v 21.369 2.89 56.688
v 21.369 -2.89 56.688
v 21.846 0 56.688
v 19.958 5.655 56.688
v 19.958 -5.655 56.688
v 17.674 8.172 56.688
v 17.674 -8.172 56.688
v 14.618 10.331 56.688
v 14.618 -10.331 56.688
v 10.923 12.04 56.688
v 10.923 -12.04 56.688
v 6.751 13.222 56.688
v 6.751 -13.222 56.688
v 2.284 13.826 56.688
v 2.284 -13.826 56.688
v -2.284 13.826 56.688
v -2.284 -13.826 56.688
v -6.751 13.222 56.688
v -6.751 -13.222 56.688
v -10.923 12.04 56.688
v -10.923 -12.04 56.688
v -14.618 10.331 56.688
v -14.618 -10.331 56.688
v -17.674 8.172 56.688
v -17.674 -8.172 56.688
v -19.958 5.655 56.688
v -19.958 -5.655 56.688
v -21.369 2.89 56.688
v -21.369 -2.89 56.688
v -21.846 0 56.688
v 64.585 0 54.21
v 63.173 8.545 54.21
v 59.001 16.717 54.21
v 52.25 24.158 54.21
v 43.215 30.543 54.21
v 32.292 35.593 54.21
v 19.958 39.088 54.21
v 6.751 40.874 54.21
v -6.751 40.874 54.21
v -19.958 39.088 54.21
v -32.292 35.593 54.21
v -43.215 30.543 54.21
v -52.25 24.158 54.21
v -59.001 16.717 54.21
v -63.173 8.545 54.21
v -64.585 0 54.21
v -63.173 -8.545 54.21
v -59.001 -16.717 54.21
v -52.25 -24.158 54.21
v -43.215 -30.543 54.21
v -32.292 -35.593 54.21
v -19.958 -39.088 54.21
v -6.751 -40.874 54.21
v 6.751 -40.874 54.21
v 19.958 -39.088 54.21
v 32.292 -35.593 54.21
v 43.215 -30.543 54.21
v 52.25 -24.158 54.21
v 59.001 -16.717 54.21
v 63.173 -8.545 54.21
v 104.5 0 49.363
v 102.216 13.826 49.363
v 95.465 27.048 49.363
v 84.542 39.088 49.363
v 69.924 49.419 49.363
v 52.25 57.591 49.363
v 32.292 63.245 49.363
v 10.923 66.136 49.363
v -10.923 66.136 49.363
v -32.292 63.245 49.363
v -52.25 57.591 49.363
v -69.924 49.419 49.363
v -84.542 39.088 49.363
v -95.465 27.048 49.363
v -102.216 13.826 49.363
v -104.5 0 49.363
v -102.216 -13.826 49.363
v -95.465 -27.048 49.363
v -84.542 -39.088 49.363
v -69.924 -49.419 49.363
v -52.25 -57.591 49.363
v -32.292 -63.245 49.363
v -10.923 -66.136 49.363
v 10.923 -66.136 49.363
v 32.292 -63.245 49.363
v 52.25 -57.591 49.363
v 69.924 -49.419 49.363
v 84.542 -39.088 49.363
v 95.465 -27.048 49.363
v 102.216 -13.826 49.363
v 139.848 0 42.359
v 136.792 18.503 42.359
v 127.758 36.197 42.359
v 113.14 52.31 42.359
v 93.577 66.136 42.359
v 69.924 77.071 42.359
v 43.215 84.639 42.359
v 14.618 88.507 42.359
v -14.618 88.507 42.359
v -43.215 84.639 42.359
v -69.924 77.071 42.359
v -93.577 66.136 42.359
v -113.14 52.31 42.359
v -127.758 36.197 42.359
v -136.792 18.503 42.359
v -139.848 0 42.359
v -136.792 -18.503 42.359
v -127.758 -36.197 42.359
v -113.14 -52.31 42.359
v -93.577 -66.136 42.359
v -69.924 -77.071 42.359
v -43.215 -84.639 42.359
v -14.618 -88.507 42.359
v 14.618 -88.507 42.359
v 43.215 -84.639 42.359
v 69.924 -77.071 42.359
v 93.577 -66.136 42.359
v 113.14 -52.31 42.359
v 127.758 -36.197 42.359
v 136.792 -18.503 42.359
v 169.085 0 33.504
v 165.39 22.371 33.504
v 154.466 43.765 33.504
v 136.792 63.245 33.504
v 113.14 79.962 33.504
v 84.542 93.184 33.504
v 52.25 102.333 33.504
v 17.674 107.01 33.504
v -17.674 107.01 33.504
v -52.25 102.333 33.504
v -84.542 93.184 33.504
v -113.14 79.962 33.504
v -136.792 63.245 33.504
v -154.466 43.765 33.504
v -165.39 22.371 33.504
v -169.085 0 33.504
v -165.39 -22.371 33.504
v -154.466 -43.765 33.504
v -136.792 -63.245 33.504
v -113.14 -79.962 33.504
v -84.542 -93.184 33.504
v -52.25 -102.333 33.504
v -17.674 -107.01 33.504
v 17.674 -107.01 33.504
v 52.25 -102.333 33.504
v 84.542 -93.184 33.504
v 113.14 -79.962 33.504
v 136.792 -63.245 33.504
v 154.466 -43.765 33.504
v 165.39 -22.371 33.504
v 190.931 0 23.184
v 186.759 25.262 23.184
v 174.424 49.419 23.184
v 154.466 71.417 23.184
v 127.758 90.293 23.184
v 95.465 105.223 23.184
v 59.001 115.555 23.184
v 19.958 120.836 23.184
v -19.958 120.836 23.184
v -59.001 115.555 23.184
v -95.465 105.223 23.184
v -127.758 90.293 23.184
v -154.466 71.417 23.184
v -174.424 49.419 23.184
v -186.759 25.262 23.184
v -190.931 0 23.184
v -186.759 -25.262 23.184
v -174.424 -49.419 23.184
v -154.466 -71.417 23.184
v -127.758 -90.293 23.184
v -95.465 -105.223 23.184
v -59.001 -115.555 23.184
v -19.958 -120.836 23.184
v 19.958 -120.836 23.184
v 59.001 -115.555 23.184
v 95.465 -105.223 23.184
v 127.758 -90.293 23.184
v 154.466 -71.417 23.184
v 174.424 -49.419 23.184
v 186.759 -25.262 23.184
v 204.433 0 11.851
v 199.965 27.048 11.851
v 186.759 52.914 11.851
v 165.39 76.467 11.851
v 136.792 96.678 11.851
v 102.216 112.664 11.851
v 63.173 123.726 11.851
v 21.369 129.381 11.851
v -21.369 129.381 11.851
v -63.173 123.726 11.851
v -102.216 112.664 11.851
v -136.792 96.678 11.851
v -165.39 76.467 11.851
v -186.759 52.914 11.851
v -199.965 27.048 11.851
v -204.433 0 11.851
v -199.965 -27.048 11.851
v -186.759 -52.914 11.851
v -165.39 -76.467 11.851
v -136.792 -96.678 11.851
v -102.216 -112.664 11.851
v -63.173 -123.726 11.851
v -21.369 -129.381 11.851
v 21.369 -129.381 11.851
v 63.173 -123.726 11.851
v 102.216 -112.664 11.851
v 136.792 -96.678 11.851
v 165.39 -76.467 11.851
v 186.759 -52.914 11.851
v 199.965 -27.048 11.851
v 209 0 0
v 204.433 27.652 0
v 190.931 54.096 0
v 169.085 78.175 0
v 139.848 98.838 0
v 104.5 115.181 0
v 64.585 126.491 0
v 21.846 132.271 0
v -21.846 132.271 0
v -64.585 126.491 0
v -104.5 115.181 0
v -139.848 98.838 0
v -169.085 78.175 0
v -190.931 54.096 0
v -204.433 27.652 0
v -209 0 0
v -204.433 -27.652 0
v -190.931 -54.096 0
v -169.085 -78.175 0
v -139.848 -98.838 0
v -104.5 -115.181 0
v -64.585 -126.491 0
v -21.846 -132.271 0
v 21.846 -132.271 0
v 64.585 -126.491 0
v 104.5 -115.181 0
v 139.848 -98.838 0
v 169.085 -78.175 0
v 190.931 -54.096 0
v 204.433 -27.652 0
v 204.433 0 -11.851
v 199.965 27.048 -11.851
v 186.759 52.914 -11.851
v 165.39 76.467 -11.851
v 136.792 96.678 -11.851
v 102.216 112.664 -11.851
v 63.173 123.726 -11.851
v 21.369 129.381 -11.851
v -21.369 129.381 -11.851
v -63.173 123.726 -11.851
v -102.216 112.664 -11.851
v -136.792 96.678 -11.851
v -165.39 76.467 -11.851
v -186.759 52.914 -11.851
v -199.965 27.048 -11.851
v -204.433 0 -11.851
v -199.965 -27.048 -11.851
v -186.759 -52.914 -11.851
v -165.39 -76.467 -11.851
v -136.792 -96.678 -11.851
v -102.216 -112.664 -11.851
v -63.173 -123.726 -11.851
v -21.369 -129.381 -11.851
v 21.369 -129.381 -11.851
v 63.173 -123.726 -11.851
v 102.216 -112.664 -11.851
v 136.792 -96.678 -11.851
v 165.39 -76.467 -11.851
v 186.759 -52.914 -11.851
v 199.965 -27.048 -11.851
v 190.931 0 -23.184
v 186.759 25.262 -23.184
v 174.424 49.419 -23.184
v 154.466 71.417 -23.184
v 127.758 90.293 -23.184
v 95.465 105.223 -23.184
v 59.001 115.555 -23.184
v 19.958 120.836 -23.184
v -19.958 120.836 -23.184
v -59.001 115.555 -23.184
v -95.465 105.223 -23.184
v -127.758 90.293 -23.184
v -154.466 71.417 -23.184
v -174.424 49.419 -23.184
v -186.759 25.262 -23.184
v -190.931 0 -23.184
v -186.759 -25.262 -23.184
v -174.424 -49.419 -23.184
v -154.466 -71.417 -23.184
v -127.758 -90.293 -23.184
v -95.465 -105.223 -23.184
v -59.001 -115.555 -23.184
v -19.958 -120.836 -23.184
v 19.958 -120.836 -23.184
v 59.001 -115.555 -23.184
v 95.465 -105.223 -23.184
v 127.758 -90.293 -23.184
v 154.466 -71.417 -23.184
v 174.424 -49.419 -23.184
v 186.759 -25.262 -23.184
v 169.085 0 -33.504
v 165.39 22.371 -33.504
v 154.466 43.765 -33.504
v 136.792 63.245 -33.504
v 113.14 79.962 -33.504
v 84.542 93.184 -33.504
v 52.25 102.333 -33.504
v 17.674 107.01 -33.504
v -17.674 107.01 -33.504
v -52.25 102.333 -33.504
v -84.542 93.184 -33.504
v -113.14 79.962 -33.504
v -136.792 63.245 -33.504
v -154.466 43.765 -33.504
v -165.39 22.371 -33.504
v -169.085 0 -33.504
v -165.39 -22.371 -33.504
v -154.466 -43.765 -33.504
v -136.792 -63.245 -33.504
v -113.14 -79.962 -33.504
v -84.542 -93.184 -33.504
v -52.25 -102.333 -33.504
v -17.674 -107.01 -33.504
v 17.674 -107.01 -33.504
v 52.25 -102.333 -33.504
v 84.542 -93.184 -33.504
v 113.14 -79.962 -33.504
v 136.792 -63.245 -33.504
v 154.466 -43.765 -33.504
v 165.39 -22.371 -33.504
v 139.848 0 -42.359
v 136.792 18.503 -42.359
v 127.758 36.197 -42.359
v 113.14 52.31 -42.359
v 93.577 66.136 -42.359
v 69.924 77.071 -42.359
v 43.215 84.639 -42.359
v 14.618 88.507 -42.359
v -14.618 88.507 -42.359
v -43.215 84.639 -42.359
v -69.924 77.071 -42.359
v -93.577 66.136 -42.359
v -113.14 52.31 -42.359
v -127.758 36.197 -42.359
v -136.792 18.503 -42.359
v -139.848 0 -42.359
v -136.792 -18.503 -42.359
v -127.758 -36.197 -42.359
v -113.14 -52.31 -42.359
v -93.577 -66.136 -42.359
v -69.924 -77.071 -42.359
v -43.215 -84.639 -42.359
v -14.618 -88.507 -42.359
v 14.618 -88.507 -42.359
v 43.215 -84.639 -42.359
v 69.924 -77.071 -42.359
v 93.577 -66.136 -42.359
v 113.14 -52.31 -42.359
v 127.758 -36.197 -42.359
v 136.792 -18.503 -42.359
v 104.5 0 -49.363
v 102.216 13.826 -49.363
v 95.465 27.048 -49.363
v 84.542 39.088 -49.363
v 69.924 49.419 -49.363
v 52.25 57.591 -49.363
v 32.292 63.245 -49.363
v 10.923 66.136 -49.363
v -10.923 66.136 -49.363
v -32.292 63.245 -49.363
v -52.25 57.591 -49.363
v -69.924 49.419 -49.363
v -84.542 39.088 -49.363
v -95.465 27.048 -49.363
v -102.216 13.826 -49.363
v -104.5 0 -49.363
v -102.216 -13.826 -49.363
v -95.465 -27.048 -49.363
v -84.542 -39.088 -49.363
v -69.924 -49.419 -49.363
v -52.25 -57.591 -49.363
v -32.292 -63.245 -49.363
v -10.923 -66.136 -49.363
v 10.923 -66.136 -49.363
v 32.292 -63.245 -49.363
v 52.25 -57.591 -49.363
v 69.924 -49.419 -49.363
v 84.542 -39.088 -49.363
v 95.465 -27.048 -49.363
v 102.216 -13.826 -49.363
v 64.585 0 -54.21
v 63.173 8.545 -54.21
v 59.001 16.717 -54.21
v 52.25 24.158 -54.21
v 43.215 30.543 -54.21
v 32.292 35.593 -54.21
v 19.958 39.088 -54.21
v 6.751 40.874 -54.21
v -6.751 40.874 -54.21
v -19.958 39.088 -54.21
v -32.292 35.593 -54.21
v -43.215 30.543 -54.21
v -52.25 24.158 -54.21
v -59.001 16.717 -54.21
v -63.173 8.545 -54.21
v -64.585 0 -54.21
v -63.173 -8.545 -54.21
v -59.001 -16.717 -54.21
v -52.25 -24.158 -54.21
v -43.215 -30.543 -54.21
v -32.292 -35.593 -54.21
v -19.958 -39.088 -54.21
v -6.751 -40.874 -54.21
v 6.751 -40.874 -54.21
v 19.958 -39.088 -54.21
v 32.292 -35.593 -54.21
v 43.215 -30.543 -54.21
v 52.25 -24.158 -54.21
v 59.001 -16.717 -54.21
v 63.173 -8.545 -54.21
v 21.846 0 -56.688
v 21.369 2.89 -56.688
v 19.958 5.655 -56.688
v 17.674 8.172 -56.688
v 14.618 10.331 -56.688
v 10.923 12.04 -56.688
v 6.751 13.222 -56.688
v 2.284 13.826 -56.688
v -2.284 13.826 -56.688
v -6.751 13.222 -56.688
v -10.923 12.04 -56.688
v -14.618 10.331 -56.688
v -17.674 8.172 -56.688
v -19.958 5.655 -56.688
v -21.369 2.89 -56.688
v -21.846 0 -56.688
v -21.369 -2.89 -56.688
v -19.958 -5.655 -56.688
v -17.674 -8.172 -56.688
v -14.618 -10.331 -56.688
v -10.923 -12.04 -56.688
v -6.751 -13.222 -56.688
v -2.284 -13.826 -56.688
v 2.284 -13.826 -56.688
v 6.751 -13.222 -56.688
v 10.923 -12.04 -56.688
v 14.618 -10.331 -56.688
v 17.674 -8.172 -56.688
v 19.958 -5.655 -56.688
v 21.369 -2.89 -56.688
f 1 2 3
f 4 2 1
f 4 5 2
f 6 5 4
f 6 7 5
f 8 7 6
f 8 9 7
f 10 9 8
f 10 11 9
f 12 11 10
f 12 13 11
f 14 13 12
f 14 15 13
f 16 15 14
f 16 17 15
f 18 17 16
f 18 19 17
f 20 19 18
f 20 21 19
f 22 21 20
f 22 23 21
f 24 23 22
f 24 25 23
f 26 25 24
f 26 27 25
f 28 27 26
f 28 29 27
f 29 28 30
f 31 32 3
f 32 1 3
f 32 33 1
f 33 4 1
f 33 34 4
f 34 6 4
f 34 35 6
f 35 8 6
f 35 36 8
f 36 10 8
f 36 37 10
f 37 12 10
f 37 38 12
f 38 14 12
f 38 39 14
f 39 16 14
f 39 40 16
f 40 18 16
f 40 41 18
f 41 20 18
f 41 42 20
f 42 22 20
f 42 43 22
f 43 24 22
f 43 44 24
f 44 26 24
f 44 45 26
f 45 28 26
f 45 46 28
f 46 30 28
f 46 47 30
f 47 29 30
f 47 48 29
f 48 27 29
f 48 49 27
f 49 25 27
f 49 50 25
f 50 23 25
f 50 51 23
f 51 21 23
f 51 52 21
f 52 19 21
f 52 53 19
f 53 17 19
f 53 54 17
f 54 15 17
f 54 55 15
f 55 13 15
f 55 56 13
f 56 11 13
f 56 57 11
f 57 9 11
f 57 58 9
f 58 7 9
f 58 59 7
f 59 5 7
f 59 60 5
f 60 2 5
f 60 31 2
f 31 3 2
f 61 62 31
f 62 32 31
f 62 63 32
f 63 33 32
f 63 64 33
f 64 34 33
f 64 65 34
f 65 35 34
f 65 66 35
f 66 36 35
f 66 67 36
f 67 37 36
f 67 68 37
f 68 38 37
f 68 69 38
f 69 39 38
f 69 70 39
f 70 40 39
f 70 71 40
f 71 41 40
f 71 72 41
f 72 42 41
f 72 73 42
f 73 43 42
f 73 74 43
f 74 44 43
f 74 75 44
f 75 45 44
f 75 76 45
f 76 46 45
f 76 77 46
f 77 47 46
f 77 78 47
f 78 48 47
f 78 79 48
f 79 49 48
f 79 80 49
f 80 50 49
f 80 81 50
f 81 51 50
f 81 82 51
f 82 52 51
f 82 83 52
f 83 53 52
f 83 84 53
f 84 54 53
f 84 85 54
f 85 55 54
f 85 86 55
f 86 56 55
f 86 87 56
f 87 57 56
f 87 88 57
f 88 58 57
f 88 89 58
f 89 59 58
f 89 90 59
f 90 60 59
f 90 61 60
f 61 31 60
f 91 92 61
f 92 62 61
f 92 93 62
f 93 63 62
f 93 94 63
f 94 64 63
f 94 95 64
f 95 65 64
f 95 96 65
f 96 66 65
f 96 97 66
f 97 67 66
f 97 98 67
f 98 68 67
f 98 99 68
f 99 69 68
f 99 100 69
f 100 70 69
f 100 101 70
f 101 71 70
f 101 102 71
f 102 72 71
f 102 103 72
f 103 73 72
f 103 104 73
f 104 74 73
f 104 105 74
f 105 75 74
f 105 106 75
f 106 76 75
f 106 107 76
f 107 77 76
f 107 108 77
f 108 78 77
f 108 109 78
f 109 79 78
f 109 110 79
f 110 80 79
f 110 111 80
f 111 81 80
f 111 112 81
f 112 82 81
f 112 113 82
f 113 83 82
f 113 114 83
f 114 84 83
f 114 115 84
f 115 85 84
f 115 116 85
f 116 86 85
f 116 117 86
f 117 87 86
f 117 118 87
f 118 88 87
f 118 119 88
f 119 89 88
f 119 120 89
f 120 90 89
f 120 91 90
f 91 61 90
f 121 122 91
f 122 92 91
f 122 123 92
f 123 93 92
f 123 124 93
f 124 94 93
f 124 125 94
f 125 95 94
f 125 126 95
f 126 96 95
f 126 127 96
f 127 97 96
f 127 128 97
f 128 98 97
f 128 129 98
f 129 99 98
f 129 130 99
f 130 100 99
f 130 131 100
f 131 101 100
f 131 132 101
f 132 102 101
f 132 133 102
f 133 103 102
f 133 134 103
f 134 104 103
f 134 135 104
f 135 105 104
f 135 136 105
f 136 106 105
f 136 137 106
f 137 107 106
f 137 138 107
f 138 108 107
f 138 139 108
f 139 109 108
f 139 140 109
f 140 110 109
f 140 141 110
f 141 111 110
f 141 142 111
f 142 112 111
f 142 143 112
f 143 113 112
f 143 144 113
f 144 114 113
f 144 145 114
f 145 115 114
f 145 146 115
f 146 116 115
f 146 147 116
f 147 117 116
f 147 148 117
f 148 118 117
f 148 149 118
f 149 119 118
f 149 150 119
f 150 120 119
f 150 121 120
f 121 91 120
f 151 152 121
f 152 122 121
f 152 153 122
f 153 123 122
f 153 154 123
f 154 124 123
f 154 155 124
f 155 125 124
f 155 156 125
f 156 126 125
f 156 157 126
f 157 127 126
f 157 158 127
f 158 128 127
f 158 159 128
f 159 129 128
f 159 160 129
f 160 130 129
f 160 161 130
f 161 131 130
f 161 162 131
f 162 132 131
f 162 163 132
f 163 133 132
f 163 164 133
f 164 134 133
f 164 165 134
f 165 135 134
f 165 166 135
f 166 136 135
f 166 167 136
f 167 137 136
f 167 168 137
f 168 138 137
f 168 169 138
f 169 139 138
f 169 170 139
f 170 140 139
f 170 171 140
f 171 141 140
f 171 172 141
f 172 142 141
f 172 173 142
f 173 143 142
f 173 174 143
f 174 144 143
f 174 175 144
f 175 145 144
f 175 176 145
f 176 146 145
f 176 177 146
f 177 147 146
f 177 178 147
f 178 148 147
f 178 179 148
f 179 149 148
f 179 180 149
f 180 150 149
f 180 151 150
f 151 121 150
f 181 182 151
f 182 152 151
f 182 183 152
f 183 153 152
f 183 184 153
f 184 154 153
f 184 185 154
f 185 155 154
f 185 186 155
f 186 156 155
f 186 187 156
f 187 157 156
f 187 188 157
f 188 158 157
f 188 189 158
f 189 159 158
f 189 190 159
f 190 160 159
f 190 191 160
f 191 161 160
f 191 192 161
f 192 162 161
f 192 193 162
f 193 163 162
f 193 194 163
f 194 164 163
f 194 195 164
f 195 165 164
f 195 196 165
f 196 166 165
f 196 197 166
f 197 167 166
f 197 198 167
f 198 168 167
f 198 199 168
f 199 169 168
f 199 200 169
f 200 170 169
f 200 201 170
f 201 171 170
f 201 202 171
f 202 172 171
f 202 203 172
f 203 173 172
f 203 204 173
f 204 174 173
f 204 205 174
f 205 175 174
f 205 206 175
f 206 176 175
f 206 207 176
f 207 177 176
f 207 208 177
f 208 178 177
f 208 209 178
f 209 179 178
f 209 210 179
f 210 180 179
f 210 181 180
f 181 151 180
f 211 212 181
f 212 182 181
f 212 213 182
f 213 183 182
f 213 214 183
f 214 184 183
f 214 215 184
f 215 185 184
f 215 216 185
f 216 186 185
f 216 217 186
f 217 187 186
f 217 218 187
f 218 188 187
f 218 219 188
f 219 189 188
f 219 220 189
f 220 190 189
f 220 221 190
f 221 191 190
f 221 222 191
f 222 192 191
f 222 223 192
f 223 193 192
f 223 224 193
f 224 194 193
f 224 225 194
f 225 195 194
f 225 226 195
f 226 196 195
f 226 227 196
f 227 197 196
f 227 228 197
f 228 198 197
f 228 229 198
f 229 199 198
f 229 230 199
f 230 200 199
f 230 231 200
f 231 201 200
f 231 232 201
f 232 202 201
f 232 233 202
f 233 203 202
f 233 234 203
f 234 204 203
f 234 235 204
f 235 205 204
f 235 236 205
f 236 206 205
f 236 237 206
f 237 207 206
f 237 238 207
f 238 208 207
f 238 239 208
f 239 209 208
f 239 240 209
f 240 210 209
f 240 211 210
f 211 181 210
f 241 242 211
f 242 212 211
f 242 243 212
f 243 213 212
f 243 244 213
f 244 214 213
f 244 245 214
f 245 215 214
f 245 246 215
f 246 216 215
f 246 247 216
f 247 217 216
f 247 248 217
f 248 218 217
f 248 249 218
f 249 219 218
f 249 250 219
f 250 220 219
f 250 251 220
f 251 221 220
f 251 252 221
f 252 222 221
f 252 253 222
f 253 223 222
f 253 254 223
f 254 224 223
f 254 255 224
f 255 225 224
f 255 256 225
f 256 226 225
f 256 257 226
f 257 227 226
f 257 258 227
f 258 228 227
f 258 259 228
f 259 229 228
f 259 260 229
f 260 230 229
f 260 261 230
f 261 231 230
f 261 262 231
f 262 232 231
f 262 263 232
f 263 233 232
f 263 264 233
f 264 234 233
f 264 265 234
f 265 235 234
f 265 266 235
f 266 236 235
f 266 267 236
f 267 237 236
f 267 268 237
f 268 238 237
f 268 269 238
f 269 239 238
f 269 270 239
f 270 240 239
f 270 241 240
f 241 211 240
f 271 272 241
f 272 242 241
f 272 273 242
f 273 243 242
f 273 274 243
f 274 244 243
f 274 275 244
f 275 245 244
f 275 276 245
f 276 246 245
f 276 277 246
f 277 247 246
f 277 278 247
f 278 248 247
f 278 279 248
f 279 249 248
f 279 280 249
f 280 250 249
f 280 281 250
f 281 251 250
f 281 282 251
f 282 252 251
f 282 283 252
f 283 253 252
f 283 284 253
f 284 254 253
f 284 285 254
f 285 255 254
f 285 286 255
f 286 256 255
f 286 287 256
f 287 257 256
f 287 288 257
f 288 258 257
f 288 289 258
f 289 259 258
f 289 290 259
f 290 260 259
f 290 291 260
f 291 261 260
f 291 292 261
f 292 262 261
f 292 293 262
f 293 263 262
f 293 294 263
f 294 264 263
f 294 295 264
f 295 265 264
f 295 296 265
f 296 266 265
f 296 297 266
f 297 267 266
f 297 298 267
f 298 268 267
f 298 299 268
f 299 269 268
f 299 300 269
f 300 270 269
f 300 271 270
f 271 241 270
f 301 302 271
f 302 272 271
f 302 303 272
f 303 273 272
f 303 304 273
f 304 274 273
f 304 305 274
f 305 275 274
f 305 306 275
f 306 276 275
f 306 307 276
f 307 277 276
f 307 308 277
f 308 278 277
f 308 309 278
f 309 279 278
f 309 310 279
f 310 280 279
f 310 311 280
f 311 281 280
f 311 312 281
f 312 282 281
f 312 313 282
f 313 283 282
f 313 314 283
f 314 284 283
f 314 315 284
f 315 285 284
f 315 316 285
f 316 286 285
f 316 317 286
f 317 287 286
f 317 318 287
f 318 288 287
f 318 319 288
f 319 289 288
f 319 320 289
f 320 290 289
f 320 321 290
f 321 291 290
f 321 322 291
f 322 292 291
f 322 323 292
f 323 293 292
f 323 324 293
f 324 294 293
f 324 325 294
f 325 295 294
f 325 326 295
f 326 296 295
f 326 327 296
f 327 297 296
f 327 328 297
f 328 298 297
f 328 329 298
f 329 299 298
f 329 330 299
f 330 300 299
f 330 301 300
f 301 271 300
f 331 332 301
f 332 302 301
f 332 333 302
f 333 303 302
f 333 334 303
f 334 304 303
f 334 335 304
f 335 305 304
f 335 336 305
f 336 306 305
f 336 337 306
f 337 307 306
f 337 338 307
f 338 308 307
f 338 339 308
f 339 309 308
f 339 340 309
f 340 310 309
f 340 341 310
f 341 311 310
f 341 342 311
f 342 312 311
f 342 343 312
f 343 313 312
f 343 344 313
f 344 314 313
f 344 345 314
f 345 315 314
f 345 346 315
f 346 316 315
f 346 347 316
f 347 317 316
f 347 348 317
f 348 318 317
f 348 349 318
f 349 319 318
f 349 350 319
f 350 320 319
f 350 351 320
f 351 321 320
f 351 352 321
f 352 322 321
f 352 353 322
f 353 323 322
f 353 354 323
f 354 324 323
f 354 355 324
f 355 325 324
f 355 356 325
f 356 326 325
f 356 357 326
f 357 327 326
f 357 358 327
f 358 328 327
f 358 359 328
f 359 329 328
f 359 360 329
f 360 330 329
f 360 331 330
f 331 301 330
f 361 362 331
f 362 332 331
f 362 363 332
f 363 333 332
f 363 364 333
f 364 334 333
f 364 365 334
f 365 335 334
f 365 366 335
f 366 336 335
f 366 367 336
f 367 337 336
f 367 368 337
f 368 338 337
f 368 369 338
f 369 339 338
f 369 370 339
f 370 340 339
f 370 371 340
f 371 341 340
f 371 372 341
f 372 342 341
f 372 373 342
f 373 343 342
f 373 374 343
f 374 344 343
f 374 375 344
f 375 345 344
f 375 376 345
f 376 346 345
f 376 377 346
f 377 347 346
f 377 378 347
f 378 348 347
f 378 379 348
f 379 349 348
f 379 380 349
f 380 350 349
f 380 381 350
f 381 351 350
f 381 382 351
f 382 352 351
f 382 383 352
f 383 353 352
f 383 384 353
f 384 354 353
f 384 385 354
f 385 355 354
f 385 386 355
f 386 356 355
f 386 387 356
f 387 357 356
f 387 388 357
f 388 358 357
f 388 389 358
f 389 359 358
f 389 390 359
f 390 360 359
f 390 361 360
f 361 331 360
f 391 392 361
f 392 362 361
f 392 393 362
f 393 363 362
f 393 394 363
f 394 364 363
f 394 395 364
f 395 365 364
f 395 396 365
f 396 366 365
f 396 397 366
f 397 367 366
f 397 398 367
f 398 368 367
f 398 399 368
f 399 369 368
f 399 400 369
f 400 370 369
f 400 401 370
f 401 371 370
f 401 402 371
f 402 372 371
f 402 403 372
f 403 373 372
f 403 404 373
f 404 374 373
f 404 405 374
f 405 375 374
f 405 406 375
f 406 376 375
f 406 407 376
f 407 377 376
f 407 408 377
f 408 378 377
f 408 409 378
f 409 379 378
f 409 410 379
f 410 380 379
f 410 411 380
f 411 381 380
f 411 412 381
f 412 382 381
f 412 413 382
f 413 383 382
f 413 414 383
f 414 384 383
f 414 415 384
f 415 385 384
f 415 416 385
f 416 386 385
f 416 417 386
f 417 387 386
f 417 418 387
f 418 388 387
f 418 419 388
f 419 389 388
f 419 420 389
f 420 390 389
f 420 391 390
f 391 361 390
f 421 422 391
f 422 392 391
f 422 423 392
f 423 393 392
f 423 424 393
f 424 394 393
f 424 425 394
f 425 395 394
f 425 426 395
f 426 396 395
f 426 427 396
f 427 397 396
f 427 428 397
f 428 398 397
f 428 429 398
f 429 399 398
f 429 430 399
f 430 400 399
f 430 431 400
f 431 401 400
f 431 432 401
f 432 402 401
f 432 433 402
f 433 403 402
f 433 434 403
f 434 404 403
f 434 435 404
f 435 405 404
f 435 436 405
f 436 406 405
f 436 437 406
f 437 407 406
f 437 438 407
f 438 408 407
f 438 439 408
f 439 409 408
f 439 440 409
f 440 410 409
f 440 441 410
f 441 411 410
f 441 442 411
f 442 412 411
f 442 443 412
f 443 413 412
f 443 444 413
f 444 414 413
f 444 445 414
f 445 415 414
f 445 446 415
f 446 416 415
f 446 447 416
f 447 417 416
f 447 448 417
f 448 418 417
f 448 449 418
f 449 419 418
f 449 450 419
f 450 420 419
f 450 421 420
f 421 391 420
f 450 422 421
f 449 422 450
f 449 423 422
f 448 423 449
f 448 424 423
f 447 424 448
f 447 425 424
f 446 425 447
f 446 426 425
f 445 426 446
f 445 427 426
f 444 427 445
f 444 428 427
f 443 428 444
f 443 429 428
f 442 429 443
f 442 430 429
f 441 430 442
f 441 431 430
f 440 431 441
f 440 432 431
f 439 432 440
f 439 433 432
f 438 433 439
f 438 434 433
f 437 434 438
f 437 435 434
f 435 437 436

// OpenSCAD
// Generated by SolidPython 1.0.1 on 2020-07-29 00:46:49


scale(v = [11, 7, 3]) {
	sphere(r = 19);
}
/***********************************************
*********      SolidPython code:      **********
************************************************
 
# import packages: SolidPython
from solid import *
from solid.utils import *
from itertools import chain, combinations, permutations


class Resize:

    def __init__(self, scad_file):
        self.scad_file = scad_file
        #self.scad_file = import_scad(scad_file)
        # cone/cylinder param:
        self.r1 = 0
        self.r2 = 0
        self.h = 0
        # rectangular prism param:
        self.w = 0
        self.l = 0
        # ellipse param:
        self.r = 0

    # import OpenScad code (file name corresponds to shape)


    # classify shape + parameters
    def assign(self, param1, param2, param3):
        if self.scad_file == 'cone.scad':
            self.r1 = param1
            self.r2 = param2
            self.h = param3
        elif self.scad_file == 'cylinder.scad':
            self.r1 = param1
            self.r2 = param2
            self.h = param3
        elif self.scad_file == 'rectangularPrism.scad':
            self.h = param1
            self.l = param2
            self.w = param3
        else:
            self.r = param1
            self.h = param2

    # resize parameters
    def iterate(self):
        x = range(3, 20, 2)
        i = 1
        if self.scad_file == 'cone.scad':
            tempList = list(permutations(x, 2))
            for temp in tempList:
                param1 = temp[0]
                param2 = temp[1]
                filepath = 'produced_scad_files/' + 'cone' + str(param1) + '_' + str(param2) + '_' + '.scad'
                scad_render_to_file(cylinder(h=param1, r1=param2, r2=0), filepath)

        elif self.scad_file == 'cylinder.scad':
            tempList = list(permutations(x, 3))
            for temp in tempList:
                param1 = temp[0]
                param2 = temp[1]
                filepath = 'produced_scad_files/' + 'cylinder' + str(param1) + '_' + str(param2) + '_' + '.scad'
                scad_render_to_file(cylinder(h=param1, r1=param2, r2=param2), filepath)

        elif self.scad_file == 'rectangularPrism.scad':
            tempList = list(permutations(x, 3))
            for temp in tempList:
                param1 = temp[0]
                param2 = temp[1]
                param3 = temp[2]
                filepath = 'produced_scad_files/' + 'rectangularPrism' + str(param1) + '_' + str(param2) + '_' + str(
                    param3) + '.scad'
                scad_render_to_file(cube(size=(param1, param2, param3)), filepath)

        elif self.scad_file == 'ellipse.scad':
            tempList = list(permutations(x, 4))
            for temp in tempList:
                param1 = temp[0]
                param2 = temp[1]
                param3 = temp[2]
                param4 = temp[3]
                filepath = 'produced_scad_files/' + 'ellipse' + str(param1) + '_' + str(param2) + '_' + str(param3) + '_' + str(param4) + '.scad'
                scad_render_to_file(scale([param1, param2, param3])(sphere(r=param4)), filepath)

    def render_to_scadfile(self):
        scad_render_to_file(scad, 'example.scad') 
 
************************************************/
